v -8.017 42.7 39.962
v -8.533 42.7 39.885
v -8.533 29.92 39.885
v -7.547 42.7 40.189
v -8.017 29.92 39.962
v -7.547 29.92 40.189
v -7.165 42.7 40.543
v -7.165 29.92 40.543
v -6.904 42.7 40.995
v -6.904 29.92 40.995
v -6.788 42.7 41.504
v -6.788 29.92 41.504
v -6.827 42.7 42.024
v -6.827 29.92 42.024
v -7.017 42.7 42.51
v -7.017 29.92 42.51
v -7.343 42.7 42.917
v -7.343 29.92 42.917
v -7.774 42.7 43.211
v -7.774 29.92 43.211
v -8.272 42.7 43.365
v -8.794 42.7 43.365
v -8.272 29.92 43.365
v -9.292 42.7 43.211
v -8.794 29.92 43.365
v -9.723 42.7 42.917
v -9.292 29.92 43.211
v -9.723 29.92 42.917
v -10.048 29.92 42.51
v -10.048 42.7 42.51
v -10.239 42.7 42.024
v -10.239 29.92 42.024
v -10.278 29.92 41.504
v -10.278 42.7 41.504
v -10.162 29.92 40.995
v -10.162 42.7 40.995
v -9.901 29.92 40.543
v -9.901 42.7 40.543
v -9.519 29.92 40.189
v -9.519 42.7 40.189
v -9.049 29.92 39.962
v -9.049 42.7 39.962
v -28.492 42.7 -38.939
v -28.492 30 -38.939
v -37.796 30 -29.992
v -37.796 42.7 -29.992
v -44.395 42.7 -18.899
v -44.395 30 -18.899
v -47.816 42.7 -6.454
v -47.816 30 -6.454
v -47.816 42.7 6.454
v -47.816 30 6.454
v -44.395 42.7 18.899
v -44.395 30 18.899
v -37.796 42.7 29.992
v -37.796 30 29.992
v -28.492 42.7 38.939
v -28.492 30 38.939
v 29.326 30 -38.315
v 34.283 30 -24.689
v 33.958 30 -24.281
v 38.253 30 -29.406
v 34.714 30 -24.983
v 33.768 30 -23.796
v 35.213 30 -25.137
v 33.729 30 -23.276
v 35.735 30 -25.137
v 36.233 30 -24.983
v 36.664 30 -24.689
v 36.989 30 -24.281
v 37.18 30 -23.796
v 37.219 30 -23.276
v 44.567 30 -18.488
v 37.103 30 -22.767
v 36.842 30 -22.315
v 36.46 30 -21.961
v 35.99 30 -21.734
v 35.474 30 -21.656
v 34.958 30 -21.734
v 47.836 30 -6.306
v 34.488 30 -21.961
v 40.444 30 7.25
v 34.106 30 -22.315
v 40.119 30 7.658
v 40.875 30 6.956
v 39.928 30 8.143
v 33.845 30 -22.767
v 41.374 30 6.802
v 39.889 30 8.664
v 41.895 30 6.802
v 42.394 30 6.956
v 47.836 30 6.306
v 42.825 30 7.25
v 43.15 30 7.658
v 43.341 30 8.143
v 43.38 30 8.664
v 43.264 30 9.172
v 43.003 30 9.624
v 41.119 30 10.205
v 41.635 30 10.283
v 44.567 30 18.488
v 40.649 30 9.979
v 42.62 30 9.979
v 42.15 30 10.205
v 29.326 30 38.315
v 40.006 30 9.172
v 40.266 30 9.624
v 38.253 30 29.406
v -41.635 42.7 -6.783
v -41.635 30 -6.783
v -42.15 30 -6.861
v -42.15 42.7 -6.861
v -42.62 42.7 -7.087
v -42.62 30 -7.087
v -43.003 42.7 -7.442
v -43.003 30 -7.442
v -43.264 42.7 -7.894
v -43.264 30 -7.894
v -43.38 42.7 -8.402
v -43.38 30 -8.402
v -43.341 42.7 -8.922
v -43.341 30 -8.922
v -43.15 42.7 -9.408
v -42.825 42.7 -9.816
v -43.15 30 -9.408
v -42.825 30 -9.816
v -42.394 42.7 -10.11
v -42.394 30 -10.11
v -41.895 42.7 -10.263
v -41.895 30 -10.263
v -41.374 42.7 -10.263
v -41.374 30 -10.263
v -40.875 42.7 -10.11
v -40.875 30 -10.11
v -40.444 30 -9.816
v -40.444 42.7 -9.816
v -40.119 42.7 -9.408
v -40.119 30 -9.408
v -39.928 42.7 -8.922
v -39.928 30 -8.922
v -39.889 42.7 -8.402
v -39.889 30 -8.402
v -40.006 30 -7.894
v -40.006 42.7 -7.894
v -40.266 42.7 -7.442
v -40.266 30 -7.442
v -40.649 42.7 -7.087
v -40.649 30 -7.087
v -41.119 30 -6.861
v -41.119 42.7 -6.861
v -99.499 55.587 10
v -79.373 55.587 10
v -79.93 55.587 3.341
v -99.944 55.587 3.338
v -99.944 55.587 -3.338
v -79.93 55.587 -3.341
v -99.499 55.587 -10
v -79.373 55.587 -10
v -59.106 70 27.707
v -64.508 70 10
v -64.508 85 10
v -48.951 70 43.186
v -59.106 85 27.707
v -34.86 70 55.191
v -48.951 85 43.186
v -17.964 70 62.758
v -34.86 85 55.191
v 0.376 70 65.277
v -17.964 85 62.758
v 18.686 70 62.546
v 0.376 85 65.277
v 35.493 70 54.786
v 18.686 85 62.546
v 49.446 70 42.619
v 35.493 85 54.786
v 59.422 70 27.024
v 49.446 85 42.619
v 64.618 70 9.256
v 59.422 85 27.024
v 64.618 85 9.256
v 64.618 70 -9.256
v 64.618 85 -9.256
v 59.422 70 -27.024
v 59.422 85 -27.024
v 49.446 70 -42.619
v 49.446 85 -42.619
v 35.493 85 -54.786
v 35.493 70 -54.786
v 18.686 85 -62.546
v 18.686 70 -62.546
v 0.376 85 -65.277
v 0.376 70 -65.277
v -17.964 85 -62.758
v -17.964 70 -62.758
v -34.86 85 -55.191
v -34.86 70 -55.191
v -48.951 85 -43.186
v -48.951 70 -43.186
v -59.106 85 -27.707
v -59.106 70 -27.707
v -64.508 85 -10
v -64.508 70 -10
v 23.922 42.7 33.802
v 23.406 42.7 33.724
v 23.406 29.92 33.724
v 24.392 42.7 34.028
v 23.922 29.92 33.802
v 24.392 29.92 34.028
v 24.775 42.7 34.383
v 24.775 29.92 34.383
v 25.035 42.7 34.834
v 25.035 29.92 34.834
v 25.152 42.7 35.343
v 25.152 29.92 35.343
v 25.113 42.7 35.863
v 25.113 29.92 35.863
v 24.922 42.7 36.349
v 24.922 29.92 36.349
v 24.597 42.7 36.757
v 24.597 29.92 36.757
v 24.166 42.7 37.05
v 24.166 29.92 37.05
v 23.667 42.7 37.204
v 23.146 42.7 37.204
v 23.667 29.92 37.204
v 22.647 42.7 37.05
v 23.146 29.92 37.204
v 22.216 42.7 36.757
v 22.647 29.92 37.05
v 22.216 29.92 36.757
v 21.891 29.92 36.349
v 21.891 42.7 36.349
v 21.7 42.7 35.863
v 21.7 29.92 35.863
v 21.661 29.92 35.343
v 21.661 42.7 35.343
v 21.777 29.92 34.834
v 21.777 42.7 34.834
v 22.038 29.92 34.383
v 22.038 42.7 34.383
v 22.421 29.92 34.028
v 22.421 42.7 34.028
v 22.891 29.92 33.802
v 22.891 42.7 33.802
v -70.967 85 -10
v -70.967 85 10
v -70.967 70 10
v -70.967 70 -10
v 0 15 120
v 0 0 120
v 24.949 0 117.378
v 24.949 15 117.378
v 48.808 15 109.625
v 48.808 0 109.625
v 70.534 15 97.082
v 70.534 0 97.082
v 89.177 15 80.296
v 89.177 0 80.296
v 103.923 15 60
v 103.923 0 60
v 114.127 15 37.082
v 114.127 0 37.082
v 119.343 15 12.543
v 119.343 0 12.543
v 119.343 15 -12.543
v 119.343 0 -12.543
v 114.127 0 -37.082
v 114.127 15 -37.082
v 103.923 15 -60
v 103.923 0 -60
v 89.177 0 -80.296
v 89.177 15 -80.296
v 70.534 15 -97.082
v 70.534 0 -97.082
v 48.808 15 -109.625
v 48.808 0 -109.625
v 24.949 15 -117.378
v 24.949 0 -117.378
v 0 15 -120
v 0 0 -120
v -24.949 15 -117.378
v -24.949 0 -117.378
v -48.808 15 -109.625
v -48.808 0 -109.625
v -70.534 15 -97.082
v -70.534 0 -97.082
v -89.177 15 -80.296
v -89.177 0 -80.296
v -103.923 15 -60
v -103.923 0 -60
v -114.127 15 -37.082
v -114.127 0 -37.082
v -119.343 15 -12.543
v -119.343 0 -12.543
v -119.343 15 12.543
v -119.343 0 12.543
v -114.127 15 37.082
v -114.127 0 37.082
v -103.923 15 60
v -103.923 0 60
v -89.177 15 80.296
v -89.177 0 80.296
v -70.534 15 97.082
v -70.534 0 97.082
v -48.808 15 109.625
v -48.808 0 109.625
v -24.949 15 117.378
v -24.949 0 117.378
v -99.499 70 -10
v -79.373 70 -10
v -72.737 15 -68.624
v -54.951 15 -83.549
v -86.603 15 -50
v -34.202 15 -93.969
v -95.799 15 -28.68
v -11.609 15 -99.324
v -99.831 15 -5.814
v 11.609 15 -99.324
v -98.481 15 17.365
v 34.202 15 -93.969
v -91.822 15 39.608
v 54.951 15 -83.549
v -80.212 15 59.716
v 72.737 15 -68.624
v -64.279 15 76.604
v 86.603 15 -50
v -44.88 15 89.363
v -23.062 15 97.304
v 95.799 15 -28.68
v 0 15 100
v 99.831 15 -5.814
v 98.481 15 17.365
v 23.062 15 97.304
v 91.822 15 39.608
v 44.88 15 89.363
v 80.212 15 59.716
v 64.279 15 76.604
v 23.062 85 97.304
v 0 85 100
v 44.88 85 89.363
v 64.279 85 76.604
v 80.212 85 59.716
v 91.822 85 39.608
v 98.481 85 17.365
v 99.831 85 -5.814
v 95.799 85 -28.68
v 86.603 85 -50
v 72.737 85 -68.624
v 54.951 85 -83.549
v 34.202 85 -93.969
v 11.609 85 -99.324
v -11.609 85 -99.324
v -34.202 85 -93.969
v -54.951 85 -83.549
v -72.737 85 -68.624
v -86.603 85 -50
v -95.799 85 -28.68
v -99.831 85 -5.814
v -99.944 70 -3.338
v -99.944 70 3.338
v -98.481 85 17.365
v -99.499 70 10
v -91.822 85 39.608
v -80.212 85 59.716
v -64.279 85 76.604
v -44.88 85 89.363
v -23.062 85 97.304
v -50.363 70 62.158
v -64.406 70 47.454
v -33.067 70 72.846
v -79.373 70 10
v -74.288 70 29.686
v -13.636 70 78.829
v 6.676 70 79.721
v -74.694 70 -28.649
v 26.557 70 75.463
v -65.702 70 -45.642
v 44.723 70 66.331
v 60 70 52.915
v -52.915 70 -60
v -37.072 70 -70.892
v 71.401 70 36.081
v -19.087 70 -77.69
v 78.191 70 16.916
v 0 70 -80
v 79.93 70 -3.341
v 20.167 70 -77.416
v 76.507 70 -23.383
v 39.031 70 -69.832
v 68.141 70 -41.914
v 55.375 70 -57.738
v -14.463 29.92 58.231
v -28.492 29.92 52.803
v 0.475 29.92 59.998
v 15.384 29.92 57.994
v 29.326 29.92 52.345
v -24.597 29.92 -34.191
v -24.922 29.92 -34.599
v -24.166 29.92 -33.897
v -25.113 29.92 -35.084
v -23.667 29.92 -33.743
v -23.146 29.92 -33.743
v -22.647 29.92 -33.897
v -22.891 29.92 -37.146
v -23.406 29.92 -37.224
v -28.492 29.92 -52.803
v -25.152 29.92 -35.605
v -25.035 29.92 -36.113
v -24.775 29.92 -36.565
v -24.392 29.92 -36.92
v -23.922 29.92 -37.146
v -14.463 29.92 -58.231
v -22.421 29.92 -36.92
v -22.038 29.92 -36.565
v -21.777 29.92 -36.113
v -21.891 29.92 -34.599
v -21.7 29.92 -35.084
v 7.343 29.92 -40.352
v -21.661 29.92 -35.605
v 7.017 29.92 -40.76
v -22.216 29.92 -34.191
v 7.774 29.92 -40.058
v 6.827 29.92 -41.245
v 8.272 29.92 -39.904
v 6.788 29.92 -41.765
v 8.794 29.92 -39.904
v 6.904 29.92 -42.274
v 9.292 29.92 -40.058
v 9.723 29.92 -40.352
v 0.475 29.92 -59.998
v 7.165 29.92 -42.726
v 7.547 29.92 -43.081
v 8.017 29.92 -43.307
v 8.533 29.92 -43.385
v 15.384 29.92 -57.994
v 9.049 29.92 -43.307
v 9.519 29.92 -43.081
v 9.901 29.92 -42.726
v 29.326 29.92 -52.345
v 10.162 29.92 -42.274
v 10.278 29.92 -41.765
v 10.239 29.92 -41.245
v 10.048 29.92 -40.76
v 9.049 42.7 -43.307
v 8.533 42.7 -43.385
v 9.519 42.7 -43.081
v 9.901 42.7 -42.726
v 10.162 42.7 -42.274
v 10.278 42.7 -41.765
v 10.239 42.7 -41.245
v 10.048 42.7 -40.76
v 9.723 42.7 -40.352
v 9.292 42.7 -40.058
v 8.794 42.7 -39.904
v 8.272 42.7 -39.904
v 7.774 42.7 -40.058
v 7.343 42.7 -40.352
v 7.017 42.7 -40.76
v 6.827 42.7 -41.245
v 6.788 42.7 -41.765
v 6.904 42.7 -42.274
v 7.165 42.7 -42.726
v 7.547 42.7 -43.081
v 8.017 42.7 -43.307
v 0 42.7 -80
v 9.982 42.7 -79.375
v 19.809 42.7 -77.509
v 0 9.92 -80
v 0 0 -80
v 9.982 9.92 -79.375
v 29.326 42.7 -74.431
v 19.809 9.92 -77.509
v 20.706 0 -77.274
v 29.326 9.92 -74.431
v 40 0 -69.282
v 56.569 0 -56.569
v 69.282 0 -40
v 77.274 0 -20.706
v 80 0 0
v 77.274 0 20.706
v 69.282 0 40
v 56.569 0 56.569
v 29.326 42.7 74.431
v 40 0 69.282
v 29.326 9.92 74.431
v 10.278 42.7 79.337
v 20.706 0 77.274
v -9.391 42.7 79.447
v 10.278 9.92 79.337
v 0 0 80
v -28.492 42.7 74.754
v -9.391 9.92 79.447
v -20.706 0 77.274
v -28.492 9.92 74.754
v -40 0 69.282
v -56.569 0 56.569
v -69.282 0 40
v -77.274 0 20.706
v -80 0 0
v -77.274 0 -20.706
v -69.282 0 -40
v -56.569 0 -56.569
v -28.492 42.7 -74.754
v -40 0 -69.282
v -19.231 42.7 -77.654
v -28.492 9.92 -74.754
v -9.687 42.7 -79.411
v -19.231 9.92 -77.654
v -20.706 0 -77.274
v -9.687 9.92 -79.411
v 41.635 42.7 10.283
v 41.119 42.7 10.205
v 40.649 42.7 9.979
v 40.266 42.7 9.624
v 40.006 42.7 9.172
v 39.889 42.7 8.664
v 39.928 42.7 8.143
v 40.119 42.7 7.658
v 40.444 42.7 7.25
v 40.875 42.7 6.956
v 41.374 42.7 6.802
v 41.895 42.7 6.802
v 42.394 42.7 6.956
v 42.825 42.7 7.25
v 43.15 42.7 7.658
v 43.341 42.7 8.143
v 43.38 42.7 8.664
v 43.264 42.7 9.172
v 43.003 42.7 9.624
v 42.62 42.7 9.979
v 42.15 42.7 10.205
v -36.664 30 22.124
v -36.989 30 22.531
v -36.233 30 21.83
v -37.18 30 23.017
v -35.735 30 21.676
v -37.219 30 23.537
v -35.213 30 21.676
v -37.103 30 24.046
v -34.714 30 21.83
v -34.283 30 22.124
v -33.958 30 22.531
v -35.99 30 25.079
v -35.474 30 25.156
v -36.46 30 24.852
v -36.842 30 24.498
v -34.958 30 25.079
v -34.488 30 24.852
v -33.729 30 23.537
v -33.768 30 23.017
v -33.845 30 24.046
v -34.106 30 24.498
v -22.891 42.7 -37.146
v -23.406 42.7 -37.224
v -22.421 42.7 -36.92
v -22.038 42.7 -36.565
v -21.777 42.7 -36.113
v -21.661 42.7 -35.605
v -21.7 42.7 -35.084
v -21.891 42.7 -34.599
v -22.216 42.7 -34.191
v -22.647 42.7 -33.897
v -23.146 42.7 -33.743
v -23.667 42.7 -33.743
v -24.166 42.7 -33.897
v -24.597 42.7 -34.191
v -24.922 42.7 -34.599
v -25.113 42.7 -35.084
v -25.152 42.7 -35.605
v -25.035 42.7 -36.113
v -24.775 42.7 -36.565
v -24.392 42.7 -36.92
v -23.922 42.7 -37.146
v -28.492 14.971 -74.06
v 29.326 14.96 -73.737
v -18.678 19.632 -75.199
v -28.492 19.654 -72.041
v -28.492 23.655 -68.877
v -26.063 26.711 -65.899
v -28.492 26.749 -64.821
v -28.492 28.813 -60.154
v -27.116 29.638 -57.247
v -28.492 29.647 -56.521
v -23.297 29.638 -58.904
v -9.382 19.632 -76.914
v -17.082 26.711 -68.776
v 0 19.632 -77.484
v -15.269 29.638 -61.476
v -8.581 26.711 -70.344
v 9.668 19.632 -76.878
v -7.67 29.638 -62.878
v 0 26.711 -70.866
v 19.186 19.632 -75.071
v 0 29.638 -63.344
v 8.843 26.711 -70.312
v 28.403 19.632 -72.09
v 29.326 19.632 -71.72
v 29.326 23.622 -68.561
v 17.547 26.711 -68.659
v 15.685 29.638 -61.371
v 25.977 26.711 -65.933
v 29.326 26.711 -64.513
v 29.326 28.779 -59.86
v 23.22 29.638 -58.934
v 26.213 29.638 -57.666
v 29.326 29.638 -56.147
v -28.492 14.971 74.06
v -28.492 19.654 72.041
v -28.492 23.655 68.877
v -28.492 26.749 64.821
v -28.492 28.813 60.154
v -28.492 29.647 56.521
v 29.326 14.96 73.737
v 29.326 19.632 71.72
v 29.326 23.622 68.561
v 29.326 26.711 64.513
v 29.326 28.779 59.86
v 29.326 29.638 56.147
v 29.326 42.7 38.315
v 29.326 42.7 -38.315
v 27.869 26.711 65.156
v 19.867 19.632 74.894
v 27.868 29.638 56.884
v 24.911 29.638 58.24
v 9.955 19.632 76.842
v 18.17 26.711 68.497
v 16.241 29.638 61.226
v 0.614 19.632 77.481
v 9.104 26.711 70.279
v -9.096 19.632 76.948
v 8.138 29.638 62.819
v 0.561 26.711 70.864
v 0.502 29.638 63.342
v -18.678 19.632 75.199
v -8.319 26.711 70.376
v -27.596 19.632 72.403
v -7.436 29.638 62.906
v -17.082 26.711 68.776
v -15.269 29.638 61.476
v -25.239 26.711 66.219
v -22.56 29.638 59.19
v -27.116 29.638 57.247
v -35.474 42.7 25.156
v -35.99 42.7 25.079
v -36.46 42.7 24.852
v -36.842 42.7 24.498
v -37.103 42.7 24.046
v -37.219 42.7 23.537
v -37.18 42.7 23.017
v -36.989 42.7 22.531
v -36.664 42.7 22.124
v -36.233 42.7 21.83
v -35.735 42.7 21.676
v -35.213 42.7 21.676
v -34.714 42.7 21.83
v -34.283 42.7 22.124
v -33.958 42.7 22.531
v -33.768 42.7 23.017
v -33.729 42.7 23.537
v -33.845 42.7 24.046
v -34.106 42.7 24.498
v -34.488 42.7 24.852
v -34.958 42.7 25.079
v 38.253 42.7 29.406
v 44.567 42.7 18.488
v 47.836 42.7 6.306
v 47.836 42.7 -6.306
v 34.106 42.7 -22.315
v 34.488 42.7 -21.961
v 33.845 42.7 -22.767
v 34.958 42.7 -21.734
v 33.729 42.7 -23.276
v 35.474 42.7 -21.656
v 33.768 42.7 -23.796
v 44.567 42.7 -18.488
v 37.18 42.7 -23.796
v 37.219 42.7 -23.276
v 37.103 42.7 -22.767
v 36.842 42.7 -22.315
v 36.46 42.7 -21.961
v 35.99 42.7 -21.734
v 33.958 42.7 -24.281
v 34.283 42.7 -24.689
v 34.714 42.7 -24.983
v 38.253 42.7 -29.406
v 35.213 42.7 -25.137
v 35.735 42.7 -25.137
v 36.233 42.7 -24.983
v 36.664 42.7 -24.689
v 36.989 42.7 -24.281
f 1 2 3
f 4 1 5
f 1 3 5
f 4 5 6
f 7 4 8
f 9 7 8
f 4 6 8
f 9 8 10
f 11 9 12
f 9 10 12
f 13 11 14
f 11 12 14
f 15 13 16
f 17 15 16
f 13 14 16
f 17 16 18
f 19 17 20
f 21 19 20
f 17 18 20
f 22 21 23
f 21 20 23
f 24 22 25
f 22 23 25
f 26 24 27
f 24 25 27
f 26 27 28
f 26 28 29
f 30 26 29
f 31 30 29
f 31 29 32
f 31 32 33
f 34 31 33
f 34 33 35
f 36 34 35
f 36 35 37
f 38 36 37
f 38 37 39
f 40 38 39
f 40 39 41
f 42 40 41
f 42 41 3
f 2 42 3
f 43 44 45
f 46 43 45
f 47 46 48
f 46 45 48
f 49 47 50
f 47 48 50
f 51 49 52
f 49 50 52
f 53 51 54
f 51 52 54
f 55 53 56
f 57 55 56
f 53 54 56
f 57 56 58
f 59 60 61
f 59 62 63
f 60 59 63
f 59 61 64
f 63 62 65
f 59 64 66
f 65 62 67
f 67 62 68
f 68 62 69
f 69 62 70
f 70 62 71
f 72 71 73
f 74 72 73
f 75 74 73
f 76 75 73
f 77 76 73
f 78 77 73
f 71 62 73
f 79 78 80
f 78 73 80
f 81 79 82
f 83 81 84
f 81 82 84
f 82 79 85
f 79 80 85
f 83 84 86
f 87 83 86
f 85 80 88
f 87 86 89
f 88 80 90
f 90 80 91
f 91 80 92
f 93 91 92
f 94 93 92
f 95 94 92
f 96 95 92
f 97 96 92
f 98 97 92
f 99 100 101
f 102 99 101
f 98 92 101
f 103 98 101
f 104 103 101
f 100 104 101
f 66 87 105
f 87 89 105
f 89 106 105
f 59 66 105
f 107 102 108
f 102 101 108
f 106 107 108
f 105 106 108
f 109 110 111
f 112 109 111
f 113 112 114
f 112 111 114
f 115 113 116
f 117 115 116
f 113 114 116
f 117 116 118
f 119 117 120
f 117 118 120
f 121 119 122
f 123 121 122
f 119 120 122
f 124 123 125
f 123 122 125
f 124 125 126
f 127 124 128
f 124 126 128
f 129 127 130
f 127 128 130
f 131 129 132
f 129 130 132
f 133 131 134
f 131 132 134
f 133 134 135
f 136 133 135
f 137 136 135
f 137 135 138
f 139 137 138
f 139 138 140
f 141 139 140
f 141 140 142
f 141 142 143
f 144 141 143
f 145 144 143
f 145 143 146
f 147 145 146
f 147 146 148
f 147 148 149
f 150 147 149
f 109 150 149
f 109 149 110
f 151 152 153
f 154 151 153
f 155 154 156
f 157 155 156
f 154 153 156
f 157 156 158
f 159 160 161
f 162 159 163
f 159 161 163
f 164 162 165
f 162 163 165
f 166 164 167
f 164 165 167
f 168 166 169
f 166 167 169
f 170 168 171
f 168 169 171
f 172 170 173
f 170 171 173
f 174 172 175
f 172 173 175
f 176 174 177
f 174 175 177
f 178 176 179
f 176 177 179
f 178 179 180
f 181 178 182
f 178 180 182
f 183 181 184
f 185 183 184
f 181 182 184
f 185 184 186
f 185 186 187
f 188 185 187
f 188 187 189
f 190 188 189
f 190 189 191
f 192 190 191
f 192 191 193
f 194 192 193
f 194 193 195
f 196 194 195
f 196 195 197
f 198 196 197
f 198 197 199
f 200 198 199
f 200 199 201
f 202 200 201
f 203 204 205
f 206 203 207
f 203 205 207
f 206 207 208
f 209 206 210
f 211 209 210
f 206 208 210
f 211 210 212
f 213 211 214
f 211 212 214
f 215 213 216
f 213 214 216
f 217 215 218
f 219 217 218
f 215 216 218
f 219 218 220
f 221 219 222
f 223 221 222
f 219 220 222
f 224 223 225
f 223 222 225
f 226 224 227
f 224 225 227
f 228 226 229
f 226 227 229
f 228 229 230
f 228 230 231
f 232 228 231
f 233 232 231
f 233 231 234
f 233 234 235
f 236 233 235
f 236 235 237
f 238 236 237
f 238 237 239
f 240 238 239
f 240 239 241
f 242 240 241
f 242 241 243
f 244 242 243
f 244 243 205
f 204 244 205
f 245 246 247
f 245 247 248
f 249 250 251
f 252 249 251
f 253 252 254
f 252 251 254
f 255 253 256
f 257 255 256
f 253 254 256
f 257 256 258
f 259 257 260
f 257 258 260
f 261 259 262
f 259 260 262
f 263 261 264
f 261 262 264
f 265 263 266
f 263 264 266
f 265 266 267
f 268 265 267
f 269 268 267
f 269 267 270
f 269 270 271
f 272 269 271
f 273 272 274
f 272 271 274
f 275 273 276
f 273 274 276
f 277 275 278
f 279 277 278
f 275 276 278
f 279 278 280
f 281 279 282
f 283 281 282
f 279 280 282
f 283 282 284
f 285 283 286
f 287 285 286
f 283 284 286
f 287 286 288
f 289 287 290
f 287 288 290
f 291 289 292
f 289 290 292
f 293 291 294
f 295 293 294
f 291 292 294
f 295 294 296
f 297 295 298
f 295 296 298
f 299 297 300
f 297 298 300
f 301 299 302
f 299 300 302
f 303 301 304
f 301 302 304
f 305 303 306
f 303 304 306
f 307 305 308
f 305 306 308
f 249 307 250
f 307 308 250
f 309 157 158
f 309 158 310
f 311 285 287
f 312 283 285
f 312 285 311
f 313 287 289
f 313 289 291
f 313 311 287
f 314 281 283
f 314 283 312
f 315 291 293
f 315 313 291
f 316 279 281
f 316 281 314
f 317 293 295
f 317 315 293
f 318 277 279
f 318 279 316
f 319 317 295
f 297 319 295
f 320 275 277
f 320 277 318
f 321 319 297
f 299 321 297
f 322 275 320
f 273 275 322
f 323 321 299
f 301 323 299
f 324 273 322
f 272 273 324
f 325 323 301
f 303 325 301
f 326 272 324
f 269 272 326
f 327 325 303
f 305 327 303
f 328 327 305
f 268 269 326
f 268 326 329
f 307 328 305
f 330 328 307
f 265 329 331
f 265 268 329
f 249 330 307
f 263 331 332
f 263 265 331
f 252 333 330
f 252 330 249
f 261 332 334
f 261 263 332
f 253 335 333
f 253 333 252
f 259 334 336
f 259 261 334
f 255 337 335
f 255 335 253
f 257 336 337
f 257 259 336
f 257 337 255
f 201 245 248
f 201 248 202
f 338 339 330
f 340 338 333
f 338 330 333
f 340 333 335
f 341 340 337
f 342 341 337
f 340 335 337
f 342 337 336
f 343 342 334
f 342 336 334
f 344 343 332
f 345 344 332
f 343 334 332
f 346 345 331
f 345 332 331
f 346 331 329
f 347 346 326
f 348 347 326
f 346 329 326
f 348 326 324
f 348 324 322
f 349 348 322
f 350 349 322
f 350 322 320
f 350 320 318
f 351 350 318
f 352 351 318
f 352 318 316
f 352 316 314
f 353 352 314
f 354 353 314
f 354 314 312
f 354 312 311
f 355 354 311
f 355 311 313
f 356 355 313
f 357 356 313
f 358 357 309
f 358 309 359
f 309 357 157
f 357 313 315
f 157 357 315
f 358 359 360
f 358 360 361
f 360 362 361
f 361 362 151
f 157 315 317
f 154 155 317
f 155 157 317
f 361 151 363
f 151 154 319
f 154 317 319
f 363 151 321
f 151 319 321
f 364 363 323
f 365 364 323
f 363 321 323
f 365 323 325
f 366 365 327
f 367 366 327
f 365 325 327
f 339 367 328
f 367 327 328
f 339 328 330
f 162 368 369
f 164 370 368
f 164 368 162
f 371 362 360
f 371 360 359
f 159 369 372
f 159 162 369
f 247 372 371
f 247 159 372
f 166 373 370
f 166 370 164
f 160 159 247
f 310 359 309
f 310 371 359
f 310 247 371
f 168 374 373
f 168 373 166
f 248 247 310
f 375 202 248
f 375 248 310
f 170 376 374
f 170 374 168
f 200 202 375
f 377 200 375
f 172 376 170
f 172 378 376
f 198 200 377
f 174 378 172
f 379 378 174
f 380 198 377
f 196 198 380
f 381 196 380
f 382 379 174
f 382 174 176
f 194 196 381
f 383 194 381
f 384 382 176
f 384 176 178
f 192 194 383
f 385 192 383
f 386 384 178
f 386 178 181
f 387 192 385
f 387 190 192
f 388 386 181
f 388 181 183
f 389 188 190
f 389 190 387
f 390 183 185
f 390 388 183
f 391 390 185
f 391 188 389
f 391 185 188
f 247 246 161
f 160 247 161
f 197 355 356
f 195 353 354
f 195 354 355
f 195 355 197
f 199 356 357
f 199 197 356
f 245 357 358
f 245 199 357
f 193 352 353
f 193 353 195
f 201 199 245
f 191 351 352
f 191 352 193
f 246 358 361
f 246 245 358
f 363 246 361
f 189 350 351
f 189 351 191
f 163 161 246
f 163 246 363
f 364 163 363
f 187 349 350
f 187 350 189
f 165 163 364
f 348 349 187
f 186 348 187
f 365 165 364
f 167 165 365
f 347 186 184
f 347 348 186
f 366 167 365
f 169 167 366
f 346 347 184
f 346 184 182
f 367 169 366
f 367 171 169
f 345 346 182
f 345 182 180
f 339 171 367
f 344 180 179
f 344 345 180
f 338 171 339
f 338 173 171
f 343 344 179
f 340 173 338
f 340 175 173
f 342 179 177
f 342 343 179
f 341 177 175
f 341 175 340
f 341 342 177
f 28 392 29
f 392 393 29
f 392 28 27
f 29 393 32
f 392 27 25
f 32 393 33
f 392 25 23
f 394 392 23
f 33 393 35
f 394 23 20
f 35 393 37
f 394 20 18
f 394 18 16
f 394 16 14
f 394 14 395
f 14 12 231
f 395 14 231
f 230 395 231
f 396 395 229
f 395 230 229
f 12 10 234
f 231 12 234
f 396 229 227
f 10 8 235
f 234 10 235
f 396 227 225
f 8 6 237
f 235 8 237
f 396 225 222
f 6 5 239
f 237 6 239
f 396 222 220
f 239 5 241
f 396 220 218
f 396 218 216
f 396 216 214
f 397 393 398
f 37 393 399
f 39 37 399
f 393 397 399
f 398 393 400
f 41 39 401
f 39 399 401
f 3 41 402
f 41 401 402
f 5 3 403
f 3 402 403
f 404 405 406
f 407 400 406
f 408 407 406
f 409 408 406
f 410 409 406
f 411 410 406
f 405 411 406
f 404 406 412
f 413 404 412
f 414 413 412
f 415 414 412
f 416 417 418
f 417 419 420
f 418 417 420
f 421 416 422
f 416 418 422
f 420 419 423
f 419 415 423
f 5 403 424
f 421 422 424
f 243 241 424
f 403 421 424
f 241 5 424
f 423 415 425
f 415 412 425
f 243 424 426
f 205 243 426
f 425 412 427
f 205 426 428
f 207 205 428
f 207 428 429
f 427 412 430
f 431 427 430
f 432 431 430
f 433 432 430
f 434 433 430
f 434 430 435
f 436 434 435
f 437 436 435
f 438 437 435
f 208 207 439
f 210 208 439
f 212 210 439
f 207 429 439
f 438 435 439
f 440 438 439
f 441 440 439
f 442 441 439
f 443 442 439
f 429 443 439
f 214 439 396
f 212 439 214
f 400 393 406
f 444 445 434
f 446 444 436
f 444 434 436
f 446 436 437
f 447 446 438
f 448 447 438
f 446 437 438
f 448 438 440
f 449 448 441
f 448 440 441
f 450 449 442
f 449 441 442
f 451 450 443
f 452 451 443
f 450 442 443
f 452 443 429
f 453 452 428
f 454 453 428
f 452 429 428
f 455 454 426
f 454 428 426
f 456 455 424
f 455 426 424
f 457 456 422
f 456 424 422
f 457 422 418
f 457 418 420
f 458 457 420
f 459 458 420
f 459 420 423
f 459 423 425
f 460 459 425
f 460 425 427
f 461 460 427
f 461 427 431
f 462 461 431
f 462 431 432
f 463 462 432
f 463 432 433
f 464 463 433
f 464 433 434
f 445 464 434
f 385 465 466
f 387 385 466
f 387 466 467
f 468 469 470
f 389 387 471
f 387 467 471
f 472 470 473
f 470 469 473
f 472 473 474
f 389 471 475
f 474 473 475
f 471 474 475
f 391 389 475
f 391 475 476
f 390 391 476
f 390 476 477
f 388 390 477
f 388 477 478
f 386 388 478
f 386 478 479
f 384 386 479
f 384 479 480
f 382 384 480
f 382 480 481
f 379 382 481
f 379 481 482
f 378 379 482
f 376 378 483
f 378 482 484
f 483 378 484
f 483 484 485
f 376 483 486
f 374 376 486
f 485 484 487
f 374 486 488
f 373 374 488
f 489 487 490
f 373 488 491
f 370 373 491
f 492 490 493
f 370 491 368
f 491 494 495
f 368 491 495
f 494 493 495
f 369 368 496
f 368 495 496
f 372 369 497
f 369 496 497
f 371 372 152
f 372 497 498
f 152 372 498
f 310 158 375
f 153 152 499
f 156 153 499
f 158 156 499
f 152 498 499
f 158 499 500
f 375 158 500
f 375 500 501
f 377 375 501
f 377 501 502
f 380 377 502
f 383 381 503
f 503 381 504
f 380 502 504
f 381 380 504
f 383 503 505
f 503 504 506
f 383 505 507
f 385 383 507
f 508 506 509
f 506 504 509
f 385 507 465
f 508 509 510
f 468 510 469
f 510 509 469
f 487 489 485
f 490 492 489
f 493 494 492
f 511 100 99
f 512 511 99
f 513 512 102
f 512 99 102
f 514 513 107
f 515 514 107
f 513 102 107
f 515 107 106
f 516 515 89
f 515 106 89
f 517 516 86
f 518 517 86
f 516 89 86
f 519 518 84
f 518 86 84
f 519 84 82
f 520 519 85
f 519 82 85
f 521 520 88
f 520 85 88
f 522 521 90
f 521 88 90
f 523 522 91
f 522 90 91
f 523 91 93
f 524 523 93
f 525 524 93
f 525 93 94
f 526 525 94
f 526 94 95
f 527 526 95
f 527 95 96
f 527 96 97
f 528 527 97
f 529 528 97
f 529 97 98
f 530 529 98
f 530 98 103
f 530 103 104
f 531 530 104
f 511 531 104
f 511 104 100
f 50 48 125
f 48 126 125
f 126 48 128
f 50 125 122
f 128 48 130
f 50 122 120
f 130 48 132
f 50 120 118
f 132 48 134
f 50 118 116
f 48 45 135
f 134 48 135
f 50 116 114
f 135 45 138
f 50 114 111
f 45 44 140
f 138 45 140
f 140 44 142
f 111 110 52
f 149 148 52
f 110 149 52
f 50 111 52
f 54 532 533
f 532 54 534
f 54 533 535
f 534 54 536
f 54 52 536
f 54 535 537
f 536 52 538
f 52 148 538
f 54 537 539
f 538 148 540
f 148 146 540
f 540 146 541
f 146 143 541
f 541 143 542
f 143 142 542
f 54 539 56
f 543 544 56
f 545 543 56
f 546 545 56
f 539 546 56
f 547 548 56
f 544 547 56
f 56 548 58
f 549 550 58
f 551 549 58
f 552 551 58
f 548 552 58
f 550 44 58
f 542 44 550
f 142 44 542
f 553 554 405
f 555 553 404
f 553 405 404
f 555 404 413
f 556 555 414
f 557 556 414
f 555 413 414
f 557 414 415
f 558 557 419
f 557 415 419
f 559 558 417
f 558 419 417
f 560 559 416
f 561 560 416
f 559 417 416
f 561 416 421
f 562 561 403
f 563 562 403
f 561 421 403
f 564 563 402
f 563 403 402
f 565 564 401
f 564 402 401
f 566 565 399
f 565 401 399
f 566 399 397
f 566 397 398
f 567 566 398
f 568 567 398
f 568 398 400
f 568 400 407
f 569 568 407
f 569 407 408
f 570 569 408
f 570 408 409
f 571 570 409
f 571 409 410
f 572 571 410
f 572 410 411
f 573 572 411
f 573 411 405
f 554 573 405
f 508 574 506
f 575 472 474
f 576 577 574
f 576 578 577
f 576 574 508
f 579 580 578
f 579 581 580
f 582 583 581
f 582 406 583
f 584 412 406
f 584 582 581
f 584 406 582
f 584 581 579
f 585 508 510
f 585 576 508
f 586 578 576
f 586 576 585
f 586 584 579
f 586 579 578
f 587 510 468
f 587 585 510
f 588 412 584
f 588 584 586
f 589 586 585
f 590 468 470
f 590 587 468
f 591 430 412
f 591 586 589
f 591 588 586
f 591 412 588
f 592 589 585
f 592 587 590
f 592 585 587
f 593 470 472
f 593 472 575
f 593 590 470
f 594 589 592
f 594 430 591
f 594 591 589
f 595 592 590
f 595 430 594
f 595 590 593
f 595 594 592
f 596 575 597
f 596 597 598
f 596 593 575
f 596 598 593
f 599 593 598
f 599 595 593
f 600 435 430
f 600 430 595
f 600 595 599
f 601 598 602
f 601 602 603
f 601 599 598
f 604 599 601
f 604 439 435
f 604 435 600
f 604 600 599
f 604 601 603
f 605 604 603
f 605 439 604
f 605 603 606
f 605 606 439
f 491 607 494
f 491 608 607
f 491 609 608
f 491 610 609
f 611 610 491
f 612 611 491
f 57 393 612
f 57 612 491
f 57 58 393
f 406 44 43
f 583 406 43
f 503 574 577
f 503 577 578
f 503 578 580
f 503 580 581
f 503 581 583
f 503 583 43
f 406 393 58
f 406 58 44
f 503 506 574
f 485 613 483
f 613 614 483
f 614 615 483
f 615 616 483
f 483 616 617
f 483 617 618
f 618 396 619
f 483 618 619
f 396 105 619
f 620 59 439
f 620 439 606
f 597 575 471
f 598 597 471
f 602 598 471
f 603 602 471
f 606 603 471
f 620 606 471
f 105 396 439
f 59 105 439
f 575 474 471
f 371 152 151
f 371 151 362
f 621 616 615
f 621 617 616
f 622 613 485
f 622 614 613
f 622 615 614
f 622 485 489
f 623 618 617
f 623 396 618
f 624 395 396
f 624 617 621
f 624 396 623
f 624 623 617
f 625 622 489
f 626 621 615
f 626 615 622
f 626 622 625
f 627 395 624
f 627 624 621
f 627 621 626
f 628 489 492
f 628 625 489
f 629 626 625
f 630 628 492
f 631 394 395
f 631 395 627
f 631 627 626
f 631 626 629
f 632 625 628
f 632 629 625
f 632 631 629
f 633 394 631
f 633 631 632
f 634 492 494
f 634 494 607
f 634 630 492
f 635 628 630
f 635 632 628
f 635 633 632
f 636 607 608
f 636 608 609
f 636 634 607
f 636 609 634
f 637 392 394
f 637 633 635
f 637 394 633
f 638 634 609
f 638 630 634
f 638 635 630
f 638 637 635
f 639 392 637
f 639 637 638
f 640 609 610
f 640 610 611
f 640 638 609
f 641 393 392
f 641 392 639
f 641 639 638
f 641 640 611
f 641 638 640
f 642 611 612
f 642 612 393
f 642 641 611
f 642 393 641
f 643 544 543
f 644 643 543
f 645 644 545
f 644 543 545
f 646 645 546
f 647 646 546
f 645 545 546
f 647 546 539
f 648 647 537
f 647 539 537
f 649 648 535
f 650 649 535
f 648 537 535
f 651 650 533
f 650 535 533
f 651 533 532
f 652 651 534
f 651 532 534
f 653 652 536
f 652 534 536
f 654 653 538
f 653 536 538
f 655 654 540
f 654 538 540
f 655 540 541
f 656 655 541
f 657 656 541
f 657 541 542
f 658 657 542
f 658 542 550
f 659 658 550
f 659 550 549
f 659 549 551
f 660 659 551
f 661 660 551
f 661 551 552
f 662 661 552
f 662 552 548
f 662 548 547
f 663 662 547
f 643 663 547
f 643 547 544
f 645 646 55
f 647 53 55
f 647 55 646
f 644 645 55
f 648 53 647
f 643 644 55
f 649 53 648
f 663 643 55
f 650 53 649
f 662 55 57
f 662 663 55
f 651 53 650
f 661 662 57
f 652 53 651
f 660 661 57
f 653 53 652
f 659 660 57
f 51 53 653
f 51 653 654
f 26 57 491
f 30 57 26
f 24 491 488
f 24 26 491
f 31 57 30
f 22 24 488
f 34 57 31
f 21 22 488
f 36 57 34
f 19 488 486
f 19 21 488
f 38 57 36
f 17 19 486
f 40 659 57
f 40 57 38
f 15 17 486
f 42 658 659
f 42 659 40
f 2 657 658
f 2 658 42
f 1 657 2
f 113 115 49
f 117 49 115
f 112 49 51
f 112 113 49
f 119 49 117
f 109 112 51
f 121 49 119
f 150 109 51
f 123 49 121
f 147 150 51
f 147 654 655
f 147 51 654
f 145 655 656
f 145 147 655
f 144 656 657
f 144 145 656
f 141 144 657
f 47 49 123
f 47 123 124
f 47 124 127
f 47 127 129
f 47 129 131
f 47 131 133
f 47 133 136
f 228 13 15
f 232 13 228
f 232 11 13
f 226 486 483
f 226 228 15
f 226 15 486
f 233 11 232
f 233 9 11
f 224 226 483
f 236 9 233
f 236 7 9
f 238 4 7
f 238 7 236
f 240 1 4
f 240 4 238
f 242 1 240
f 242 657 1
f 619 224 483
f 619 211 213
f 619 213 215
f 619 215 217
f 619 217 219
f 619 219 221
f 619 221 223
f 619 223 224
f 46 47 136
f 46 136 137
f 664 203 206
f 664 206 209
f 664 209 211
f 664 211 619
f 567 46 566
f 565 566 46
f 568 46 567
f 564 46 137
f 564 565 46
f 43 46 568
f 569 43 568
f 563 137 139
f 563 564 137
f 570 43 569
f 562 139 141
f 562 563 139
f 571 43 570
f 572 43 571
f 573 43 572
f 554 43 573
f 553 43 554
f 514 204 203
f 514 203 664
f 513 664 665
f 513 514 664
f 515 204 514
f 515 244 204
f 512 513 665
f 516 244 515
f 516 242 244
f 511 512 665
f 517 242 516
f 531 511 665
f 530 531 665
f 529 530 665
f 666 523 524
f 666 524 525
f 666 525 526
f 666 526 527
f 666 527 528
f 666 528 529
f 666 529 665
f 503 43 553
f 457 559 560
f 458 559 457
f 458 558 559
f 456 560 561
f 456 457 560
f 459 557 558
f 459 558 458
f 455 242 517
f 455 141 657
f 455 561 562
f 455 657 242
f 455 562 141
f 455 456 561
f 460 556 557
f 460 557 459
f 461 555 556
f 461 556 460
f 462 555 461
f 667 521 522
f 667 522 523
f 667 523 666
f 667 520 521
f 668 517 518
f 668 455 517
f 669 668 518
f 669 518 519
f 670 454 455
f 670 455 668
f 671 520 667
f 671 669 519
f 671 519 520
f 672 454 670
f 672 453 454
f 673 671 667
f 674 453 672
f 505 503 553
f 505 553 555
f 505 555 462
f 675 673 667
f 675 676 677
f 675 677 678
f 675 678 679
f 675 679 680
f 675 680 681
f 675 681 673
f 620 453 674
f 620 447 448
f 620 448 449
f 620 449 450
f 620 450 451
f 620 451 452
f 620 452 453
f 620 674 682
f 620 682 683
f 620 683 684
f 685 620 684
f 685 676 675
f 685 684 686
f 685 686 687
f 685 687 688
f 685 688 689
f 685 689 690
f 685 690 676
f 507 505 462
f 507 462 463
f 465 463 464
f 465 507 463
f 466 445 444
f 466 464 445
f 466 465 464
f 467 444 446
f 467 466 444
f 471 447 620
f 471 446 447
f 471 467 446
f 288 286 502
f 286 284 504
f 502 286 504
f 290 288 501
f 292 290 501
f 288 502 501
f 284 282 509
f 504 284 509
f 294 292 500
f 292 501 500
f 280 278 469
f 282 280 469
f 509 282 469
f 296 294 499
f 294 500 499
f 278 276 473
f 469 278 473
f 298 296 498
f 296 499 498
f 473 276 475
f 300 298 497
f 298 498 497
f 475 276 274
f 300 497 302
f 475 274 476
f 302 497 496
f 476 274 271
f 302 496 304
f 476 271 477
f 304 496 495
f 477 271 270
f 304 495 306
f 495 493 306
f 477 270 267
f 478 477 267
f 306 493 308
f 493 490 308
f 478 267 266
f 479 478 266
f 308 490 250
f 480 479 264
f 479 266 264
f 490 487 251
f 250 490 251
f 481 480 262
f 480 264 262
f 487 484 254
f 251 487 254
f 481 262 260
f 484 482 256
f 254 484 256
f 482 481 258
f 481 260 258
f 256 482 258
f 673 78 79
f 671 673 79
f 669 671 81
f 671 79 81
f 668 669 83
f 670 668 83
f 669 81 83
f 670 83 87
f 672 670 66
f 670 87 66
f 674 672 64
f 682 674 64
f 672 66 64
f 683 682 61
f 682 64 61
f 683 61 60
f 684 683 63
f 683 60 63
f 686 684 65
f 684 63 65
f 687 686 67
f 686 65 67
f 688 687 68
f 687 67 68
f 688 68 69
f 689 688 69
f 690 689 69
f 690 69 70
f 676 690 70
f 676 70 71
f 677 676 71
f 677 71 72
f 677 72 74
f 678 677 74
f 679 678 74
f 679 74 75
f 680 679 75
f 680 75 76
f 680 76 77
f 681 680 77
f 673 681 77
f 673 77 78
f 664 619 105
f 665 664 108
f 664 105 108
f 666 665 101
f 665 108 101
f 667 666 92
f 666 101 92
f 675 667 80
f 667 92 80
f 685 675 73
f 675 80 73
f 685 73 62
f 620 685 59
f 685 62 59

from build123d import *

# Parameters (mm, degrees)
SKETCH_1_R           = 120
EXTRUDE_1_DEPTH      = 15
SKETCH_2_R           = 100
EXTRUDE_2_DEPTH      = 70
SKETCH_3_R           = 80
CUT_EXTRUDE_1_DEPTH  = 70
SKETCH_4_R           = 48.25
CUT_EXTRUDE_2_DEPTH  = 65
EXTRUDE_START        = 30
SKETCH_6_R           = 48.25
EXTRUDE_3_DEPTH      = 12.7
EXTRUDE_4_DEPTH      = 85.7
EXTRUDE_4_DEPTH_BACK = 88.7
SKETCH_8_W           = 57.818005318
SKETCH_8_H           = 12.779998275
FILLET_1_R           = 20
FILLET_2_R           = 20
SKETCH_10_W          = 23.933516112
SKETCH_10_H          = 20
CUT_EXTRUDE_3_DEPTH  = 25
SKETCH_11_R          = 65.278053168
CUT_EXTRUDE_4_DEPTH  = 19
SKETCH_12_W          = 20
SKETCH_12_H          = 14.412930018
CUT_EXTRUDE_5_DEPTH  = 165
SKETCH_13_R          = 1.75
CUT_EXTRUDE_6_DEPTH  = 25


with BuildPart() as part:
    # 草图1 → 凸台-拉伸1 (new body)
    with BuildSketch(Plane(origin=(0, 0, 0), x_dir=(1, 0, 0), z_dir=(0, 1, 0))):
        with Locations(Location((0, 0, 0), (0, 0, 270))):
            Circle(SKETCH_1_R)
    extrude(amount=EXTRUDE_1_DEPTH)

    # 草图2 → 凸台-拉伸2 (add)
    with BuildSketch(Plane(origin=(0, 15, 0), x_dir=(1, 0, 0), z_dir=(0, 1, 0))):
        with Locations(Location((0, 0, 0), (0, 0, 270))):
            Circle(SKETCH_2_R)
    extrude(amount=EXTRUDE_2_DEPTH)

    # 草图3 → 切除-拉伸1 (cut)
    with BuildSketch(Plane.XZ):
        with Locations(Location((0, 0, 0), (0, 0, 270))):
            Circle(SKETCH_3_R)
    extrude(amount=-CUT_EXTRUDE_1_DEPTH, mode=Mode.SUBTRACT)

    # 草图4 → 切除-拉伸2 (cut)
    with BuildSketch(Plane(origin=(0, 85, 0), x_dir=(1, 0, 0), z_dir=(0, 1, 0))):
        with Locations(Location((0, 0, 0), (0, 0, 270))):
            Circle(SKETCH_4_R)
    extrude(amount=-CUT_EXTRUDE_2_DEPTH, mode=Mode.SUBTRACT)



with BuildPart() as body_2:
    # 草图6 → 凸台-拉伸3 (new body)
    with BuildSketch(Plane(origin=(0, 0, 0), x_dir=(1, 0, 0), z_dir=(0, 1, 0)).offset(EXTRUDE_START)):
        with Locations(Location((0, 0, 0), (0, 0, 270))):
            Circle(SKETCH_6_R)
    extrude(amount=EXTRUDE_3_DEPTH)


with BuildPart() as part_1:
    add(part.part)

    add(body_2.part)  # 凸台-拉伸4 merges body 2
    # 草图8 → 凸台-拉伸4 (add, two sides: drawn at the far end of the back side and taken through both)
    with BuildSketch(Plane.XY.offset(-EXTRUDE_4_DEPTH_BACK)):
        with Locations((0.416556234, 36.310000863)):
            Rectangle(SKETCH_8_W, SKETCH_8_H)
    extrude(amount=EXTRUDE_4_DEPTH + EXTRUDE_4_DEPTH_BACK)

    # 圆角1
    fillet_1_edges = [part_1.edges().sort_by_distance(p)[0] for p in [
        (0.446745886, 29.920001725, 79.998752603),
    ]]
    fillet(fillet_1_edges, radius=FILLET_1_R)

    # 圆角2
    fillet_2_edges = [part_1.edges().sort_by_distance(p)[0] for p in [
        (14.924805984, 29.920001725, -78.595484389),
    ]]
    fillet(fillet_2_edges, radius=FILLET_2_R)

    # 草图10 → 切除-拉伸3 (cut)
    with BuildSketch(Plane(origin=(0, 85, 0), x_dir=(1, 0, 0), z_dir=(0, 1, 0))):
        with Locations((-59, 0)):
            Rectangle(SKETCH_10_W, SKETCH_10_H)
    extrude(amount=-CUT_EXTRUDE_3_DEPTH, mode=Mode.SUBTRACT)

    # 草图11 → 切除-拉伸4 (cut)
    with BuildSketch(Plane(origin=(0, 85, 0), x_dir=(1, 0, 0), z_dir=(0, 1, 0))):
        Circle(SKETCH_11_R)
    extrude(amount=-CUT_EXTRUDE_4_DEPTH, mode=Mode.SUBTRACT)

    # 草图12 → 切除-拉伸5 (cut)
    with BuildSketch(Plane(origin=(29.325558893, 0, 0), x_dir=(0, 0, -1), z_dir=(1, 0, 0))):
        with Locations((0, 62.793534991)):
            Rectangle(SKETCH_12_W, SKETCH_12_H)
    extrude(amount=-CUT_EXTRUDE_5_DEPTH, mode=Mode.SUBTRACT)

    # 草图13 → 切除-拉伸6 (cut)
    with BuildSketch(Plane.XZ.offset(-29.920001725)):
        with Locations(Location((-8.532886067, 41.634599258, 0), (0, 0, 270))):
            Circle(SKETCH_13_R)
        with Locations(Location((23.406445866, 35.473769068, 0), (0, 0, 270))):
            Circle(SKETCH_13_R)
        with Locations(Location((41.634599258, 8.532886067, 0), (0, 0, 90))):
            Circle(SKETCH_13_R)
        with Locations(Location((35.473769068, -23.406445866, 0), (0, 0, 90))):
            Circle(SKETCH_13_R)
        with Locations(Location((8.532886067, -41.634599258, 0), (0, 0, 270))):
            Circle(SKETCH_13_R)
        with Locations(Location((-23.406445866, -35.473769068, 0), (0, 0, 270))):
            Circle(SKETCH_13_R)
        with Locations(Location((-41.634599258, -8.532886067, 0), (0, 0, 90))):
            Circle(SKETCH_13_R)
        with Locations(Location((-35.473769068, 23.406445866, 0), (0, 0, 90))):
            Circle(SKETCH_13_R)
    extrude(amount=-CUT_EXTRUDE_6_DEPTH, mode=Mode.SUBTRACT)


solid = part_1.part
